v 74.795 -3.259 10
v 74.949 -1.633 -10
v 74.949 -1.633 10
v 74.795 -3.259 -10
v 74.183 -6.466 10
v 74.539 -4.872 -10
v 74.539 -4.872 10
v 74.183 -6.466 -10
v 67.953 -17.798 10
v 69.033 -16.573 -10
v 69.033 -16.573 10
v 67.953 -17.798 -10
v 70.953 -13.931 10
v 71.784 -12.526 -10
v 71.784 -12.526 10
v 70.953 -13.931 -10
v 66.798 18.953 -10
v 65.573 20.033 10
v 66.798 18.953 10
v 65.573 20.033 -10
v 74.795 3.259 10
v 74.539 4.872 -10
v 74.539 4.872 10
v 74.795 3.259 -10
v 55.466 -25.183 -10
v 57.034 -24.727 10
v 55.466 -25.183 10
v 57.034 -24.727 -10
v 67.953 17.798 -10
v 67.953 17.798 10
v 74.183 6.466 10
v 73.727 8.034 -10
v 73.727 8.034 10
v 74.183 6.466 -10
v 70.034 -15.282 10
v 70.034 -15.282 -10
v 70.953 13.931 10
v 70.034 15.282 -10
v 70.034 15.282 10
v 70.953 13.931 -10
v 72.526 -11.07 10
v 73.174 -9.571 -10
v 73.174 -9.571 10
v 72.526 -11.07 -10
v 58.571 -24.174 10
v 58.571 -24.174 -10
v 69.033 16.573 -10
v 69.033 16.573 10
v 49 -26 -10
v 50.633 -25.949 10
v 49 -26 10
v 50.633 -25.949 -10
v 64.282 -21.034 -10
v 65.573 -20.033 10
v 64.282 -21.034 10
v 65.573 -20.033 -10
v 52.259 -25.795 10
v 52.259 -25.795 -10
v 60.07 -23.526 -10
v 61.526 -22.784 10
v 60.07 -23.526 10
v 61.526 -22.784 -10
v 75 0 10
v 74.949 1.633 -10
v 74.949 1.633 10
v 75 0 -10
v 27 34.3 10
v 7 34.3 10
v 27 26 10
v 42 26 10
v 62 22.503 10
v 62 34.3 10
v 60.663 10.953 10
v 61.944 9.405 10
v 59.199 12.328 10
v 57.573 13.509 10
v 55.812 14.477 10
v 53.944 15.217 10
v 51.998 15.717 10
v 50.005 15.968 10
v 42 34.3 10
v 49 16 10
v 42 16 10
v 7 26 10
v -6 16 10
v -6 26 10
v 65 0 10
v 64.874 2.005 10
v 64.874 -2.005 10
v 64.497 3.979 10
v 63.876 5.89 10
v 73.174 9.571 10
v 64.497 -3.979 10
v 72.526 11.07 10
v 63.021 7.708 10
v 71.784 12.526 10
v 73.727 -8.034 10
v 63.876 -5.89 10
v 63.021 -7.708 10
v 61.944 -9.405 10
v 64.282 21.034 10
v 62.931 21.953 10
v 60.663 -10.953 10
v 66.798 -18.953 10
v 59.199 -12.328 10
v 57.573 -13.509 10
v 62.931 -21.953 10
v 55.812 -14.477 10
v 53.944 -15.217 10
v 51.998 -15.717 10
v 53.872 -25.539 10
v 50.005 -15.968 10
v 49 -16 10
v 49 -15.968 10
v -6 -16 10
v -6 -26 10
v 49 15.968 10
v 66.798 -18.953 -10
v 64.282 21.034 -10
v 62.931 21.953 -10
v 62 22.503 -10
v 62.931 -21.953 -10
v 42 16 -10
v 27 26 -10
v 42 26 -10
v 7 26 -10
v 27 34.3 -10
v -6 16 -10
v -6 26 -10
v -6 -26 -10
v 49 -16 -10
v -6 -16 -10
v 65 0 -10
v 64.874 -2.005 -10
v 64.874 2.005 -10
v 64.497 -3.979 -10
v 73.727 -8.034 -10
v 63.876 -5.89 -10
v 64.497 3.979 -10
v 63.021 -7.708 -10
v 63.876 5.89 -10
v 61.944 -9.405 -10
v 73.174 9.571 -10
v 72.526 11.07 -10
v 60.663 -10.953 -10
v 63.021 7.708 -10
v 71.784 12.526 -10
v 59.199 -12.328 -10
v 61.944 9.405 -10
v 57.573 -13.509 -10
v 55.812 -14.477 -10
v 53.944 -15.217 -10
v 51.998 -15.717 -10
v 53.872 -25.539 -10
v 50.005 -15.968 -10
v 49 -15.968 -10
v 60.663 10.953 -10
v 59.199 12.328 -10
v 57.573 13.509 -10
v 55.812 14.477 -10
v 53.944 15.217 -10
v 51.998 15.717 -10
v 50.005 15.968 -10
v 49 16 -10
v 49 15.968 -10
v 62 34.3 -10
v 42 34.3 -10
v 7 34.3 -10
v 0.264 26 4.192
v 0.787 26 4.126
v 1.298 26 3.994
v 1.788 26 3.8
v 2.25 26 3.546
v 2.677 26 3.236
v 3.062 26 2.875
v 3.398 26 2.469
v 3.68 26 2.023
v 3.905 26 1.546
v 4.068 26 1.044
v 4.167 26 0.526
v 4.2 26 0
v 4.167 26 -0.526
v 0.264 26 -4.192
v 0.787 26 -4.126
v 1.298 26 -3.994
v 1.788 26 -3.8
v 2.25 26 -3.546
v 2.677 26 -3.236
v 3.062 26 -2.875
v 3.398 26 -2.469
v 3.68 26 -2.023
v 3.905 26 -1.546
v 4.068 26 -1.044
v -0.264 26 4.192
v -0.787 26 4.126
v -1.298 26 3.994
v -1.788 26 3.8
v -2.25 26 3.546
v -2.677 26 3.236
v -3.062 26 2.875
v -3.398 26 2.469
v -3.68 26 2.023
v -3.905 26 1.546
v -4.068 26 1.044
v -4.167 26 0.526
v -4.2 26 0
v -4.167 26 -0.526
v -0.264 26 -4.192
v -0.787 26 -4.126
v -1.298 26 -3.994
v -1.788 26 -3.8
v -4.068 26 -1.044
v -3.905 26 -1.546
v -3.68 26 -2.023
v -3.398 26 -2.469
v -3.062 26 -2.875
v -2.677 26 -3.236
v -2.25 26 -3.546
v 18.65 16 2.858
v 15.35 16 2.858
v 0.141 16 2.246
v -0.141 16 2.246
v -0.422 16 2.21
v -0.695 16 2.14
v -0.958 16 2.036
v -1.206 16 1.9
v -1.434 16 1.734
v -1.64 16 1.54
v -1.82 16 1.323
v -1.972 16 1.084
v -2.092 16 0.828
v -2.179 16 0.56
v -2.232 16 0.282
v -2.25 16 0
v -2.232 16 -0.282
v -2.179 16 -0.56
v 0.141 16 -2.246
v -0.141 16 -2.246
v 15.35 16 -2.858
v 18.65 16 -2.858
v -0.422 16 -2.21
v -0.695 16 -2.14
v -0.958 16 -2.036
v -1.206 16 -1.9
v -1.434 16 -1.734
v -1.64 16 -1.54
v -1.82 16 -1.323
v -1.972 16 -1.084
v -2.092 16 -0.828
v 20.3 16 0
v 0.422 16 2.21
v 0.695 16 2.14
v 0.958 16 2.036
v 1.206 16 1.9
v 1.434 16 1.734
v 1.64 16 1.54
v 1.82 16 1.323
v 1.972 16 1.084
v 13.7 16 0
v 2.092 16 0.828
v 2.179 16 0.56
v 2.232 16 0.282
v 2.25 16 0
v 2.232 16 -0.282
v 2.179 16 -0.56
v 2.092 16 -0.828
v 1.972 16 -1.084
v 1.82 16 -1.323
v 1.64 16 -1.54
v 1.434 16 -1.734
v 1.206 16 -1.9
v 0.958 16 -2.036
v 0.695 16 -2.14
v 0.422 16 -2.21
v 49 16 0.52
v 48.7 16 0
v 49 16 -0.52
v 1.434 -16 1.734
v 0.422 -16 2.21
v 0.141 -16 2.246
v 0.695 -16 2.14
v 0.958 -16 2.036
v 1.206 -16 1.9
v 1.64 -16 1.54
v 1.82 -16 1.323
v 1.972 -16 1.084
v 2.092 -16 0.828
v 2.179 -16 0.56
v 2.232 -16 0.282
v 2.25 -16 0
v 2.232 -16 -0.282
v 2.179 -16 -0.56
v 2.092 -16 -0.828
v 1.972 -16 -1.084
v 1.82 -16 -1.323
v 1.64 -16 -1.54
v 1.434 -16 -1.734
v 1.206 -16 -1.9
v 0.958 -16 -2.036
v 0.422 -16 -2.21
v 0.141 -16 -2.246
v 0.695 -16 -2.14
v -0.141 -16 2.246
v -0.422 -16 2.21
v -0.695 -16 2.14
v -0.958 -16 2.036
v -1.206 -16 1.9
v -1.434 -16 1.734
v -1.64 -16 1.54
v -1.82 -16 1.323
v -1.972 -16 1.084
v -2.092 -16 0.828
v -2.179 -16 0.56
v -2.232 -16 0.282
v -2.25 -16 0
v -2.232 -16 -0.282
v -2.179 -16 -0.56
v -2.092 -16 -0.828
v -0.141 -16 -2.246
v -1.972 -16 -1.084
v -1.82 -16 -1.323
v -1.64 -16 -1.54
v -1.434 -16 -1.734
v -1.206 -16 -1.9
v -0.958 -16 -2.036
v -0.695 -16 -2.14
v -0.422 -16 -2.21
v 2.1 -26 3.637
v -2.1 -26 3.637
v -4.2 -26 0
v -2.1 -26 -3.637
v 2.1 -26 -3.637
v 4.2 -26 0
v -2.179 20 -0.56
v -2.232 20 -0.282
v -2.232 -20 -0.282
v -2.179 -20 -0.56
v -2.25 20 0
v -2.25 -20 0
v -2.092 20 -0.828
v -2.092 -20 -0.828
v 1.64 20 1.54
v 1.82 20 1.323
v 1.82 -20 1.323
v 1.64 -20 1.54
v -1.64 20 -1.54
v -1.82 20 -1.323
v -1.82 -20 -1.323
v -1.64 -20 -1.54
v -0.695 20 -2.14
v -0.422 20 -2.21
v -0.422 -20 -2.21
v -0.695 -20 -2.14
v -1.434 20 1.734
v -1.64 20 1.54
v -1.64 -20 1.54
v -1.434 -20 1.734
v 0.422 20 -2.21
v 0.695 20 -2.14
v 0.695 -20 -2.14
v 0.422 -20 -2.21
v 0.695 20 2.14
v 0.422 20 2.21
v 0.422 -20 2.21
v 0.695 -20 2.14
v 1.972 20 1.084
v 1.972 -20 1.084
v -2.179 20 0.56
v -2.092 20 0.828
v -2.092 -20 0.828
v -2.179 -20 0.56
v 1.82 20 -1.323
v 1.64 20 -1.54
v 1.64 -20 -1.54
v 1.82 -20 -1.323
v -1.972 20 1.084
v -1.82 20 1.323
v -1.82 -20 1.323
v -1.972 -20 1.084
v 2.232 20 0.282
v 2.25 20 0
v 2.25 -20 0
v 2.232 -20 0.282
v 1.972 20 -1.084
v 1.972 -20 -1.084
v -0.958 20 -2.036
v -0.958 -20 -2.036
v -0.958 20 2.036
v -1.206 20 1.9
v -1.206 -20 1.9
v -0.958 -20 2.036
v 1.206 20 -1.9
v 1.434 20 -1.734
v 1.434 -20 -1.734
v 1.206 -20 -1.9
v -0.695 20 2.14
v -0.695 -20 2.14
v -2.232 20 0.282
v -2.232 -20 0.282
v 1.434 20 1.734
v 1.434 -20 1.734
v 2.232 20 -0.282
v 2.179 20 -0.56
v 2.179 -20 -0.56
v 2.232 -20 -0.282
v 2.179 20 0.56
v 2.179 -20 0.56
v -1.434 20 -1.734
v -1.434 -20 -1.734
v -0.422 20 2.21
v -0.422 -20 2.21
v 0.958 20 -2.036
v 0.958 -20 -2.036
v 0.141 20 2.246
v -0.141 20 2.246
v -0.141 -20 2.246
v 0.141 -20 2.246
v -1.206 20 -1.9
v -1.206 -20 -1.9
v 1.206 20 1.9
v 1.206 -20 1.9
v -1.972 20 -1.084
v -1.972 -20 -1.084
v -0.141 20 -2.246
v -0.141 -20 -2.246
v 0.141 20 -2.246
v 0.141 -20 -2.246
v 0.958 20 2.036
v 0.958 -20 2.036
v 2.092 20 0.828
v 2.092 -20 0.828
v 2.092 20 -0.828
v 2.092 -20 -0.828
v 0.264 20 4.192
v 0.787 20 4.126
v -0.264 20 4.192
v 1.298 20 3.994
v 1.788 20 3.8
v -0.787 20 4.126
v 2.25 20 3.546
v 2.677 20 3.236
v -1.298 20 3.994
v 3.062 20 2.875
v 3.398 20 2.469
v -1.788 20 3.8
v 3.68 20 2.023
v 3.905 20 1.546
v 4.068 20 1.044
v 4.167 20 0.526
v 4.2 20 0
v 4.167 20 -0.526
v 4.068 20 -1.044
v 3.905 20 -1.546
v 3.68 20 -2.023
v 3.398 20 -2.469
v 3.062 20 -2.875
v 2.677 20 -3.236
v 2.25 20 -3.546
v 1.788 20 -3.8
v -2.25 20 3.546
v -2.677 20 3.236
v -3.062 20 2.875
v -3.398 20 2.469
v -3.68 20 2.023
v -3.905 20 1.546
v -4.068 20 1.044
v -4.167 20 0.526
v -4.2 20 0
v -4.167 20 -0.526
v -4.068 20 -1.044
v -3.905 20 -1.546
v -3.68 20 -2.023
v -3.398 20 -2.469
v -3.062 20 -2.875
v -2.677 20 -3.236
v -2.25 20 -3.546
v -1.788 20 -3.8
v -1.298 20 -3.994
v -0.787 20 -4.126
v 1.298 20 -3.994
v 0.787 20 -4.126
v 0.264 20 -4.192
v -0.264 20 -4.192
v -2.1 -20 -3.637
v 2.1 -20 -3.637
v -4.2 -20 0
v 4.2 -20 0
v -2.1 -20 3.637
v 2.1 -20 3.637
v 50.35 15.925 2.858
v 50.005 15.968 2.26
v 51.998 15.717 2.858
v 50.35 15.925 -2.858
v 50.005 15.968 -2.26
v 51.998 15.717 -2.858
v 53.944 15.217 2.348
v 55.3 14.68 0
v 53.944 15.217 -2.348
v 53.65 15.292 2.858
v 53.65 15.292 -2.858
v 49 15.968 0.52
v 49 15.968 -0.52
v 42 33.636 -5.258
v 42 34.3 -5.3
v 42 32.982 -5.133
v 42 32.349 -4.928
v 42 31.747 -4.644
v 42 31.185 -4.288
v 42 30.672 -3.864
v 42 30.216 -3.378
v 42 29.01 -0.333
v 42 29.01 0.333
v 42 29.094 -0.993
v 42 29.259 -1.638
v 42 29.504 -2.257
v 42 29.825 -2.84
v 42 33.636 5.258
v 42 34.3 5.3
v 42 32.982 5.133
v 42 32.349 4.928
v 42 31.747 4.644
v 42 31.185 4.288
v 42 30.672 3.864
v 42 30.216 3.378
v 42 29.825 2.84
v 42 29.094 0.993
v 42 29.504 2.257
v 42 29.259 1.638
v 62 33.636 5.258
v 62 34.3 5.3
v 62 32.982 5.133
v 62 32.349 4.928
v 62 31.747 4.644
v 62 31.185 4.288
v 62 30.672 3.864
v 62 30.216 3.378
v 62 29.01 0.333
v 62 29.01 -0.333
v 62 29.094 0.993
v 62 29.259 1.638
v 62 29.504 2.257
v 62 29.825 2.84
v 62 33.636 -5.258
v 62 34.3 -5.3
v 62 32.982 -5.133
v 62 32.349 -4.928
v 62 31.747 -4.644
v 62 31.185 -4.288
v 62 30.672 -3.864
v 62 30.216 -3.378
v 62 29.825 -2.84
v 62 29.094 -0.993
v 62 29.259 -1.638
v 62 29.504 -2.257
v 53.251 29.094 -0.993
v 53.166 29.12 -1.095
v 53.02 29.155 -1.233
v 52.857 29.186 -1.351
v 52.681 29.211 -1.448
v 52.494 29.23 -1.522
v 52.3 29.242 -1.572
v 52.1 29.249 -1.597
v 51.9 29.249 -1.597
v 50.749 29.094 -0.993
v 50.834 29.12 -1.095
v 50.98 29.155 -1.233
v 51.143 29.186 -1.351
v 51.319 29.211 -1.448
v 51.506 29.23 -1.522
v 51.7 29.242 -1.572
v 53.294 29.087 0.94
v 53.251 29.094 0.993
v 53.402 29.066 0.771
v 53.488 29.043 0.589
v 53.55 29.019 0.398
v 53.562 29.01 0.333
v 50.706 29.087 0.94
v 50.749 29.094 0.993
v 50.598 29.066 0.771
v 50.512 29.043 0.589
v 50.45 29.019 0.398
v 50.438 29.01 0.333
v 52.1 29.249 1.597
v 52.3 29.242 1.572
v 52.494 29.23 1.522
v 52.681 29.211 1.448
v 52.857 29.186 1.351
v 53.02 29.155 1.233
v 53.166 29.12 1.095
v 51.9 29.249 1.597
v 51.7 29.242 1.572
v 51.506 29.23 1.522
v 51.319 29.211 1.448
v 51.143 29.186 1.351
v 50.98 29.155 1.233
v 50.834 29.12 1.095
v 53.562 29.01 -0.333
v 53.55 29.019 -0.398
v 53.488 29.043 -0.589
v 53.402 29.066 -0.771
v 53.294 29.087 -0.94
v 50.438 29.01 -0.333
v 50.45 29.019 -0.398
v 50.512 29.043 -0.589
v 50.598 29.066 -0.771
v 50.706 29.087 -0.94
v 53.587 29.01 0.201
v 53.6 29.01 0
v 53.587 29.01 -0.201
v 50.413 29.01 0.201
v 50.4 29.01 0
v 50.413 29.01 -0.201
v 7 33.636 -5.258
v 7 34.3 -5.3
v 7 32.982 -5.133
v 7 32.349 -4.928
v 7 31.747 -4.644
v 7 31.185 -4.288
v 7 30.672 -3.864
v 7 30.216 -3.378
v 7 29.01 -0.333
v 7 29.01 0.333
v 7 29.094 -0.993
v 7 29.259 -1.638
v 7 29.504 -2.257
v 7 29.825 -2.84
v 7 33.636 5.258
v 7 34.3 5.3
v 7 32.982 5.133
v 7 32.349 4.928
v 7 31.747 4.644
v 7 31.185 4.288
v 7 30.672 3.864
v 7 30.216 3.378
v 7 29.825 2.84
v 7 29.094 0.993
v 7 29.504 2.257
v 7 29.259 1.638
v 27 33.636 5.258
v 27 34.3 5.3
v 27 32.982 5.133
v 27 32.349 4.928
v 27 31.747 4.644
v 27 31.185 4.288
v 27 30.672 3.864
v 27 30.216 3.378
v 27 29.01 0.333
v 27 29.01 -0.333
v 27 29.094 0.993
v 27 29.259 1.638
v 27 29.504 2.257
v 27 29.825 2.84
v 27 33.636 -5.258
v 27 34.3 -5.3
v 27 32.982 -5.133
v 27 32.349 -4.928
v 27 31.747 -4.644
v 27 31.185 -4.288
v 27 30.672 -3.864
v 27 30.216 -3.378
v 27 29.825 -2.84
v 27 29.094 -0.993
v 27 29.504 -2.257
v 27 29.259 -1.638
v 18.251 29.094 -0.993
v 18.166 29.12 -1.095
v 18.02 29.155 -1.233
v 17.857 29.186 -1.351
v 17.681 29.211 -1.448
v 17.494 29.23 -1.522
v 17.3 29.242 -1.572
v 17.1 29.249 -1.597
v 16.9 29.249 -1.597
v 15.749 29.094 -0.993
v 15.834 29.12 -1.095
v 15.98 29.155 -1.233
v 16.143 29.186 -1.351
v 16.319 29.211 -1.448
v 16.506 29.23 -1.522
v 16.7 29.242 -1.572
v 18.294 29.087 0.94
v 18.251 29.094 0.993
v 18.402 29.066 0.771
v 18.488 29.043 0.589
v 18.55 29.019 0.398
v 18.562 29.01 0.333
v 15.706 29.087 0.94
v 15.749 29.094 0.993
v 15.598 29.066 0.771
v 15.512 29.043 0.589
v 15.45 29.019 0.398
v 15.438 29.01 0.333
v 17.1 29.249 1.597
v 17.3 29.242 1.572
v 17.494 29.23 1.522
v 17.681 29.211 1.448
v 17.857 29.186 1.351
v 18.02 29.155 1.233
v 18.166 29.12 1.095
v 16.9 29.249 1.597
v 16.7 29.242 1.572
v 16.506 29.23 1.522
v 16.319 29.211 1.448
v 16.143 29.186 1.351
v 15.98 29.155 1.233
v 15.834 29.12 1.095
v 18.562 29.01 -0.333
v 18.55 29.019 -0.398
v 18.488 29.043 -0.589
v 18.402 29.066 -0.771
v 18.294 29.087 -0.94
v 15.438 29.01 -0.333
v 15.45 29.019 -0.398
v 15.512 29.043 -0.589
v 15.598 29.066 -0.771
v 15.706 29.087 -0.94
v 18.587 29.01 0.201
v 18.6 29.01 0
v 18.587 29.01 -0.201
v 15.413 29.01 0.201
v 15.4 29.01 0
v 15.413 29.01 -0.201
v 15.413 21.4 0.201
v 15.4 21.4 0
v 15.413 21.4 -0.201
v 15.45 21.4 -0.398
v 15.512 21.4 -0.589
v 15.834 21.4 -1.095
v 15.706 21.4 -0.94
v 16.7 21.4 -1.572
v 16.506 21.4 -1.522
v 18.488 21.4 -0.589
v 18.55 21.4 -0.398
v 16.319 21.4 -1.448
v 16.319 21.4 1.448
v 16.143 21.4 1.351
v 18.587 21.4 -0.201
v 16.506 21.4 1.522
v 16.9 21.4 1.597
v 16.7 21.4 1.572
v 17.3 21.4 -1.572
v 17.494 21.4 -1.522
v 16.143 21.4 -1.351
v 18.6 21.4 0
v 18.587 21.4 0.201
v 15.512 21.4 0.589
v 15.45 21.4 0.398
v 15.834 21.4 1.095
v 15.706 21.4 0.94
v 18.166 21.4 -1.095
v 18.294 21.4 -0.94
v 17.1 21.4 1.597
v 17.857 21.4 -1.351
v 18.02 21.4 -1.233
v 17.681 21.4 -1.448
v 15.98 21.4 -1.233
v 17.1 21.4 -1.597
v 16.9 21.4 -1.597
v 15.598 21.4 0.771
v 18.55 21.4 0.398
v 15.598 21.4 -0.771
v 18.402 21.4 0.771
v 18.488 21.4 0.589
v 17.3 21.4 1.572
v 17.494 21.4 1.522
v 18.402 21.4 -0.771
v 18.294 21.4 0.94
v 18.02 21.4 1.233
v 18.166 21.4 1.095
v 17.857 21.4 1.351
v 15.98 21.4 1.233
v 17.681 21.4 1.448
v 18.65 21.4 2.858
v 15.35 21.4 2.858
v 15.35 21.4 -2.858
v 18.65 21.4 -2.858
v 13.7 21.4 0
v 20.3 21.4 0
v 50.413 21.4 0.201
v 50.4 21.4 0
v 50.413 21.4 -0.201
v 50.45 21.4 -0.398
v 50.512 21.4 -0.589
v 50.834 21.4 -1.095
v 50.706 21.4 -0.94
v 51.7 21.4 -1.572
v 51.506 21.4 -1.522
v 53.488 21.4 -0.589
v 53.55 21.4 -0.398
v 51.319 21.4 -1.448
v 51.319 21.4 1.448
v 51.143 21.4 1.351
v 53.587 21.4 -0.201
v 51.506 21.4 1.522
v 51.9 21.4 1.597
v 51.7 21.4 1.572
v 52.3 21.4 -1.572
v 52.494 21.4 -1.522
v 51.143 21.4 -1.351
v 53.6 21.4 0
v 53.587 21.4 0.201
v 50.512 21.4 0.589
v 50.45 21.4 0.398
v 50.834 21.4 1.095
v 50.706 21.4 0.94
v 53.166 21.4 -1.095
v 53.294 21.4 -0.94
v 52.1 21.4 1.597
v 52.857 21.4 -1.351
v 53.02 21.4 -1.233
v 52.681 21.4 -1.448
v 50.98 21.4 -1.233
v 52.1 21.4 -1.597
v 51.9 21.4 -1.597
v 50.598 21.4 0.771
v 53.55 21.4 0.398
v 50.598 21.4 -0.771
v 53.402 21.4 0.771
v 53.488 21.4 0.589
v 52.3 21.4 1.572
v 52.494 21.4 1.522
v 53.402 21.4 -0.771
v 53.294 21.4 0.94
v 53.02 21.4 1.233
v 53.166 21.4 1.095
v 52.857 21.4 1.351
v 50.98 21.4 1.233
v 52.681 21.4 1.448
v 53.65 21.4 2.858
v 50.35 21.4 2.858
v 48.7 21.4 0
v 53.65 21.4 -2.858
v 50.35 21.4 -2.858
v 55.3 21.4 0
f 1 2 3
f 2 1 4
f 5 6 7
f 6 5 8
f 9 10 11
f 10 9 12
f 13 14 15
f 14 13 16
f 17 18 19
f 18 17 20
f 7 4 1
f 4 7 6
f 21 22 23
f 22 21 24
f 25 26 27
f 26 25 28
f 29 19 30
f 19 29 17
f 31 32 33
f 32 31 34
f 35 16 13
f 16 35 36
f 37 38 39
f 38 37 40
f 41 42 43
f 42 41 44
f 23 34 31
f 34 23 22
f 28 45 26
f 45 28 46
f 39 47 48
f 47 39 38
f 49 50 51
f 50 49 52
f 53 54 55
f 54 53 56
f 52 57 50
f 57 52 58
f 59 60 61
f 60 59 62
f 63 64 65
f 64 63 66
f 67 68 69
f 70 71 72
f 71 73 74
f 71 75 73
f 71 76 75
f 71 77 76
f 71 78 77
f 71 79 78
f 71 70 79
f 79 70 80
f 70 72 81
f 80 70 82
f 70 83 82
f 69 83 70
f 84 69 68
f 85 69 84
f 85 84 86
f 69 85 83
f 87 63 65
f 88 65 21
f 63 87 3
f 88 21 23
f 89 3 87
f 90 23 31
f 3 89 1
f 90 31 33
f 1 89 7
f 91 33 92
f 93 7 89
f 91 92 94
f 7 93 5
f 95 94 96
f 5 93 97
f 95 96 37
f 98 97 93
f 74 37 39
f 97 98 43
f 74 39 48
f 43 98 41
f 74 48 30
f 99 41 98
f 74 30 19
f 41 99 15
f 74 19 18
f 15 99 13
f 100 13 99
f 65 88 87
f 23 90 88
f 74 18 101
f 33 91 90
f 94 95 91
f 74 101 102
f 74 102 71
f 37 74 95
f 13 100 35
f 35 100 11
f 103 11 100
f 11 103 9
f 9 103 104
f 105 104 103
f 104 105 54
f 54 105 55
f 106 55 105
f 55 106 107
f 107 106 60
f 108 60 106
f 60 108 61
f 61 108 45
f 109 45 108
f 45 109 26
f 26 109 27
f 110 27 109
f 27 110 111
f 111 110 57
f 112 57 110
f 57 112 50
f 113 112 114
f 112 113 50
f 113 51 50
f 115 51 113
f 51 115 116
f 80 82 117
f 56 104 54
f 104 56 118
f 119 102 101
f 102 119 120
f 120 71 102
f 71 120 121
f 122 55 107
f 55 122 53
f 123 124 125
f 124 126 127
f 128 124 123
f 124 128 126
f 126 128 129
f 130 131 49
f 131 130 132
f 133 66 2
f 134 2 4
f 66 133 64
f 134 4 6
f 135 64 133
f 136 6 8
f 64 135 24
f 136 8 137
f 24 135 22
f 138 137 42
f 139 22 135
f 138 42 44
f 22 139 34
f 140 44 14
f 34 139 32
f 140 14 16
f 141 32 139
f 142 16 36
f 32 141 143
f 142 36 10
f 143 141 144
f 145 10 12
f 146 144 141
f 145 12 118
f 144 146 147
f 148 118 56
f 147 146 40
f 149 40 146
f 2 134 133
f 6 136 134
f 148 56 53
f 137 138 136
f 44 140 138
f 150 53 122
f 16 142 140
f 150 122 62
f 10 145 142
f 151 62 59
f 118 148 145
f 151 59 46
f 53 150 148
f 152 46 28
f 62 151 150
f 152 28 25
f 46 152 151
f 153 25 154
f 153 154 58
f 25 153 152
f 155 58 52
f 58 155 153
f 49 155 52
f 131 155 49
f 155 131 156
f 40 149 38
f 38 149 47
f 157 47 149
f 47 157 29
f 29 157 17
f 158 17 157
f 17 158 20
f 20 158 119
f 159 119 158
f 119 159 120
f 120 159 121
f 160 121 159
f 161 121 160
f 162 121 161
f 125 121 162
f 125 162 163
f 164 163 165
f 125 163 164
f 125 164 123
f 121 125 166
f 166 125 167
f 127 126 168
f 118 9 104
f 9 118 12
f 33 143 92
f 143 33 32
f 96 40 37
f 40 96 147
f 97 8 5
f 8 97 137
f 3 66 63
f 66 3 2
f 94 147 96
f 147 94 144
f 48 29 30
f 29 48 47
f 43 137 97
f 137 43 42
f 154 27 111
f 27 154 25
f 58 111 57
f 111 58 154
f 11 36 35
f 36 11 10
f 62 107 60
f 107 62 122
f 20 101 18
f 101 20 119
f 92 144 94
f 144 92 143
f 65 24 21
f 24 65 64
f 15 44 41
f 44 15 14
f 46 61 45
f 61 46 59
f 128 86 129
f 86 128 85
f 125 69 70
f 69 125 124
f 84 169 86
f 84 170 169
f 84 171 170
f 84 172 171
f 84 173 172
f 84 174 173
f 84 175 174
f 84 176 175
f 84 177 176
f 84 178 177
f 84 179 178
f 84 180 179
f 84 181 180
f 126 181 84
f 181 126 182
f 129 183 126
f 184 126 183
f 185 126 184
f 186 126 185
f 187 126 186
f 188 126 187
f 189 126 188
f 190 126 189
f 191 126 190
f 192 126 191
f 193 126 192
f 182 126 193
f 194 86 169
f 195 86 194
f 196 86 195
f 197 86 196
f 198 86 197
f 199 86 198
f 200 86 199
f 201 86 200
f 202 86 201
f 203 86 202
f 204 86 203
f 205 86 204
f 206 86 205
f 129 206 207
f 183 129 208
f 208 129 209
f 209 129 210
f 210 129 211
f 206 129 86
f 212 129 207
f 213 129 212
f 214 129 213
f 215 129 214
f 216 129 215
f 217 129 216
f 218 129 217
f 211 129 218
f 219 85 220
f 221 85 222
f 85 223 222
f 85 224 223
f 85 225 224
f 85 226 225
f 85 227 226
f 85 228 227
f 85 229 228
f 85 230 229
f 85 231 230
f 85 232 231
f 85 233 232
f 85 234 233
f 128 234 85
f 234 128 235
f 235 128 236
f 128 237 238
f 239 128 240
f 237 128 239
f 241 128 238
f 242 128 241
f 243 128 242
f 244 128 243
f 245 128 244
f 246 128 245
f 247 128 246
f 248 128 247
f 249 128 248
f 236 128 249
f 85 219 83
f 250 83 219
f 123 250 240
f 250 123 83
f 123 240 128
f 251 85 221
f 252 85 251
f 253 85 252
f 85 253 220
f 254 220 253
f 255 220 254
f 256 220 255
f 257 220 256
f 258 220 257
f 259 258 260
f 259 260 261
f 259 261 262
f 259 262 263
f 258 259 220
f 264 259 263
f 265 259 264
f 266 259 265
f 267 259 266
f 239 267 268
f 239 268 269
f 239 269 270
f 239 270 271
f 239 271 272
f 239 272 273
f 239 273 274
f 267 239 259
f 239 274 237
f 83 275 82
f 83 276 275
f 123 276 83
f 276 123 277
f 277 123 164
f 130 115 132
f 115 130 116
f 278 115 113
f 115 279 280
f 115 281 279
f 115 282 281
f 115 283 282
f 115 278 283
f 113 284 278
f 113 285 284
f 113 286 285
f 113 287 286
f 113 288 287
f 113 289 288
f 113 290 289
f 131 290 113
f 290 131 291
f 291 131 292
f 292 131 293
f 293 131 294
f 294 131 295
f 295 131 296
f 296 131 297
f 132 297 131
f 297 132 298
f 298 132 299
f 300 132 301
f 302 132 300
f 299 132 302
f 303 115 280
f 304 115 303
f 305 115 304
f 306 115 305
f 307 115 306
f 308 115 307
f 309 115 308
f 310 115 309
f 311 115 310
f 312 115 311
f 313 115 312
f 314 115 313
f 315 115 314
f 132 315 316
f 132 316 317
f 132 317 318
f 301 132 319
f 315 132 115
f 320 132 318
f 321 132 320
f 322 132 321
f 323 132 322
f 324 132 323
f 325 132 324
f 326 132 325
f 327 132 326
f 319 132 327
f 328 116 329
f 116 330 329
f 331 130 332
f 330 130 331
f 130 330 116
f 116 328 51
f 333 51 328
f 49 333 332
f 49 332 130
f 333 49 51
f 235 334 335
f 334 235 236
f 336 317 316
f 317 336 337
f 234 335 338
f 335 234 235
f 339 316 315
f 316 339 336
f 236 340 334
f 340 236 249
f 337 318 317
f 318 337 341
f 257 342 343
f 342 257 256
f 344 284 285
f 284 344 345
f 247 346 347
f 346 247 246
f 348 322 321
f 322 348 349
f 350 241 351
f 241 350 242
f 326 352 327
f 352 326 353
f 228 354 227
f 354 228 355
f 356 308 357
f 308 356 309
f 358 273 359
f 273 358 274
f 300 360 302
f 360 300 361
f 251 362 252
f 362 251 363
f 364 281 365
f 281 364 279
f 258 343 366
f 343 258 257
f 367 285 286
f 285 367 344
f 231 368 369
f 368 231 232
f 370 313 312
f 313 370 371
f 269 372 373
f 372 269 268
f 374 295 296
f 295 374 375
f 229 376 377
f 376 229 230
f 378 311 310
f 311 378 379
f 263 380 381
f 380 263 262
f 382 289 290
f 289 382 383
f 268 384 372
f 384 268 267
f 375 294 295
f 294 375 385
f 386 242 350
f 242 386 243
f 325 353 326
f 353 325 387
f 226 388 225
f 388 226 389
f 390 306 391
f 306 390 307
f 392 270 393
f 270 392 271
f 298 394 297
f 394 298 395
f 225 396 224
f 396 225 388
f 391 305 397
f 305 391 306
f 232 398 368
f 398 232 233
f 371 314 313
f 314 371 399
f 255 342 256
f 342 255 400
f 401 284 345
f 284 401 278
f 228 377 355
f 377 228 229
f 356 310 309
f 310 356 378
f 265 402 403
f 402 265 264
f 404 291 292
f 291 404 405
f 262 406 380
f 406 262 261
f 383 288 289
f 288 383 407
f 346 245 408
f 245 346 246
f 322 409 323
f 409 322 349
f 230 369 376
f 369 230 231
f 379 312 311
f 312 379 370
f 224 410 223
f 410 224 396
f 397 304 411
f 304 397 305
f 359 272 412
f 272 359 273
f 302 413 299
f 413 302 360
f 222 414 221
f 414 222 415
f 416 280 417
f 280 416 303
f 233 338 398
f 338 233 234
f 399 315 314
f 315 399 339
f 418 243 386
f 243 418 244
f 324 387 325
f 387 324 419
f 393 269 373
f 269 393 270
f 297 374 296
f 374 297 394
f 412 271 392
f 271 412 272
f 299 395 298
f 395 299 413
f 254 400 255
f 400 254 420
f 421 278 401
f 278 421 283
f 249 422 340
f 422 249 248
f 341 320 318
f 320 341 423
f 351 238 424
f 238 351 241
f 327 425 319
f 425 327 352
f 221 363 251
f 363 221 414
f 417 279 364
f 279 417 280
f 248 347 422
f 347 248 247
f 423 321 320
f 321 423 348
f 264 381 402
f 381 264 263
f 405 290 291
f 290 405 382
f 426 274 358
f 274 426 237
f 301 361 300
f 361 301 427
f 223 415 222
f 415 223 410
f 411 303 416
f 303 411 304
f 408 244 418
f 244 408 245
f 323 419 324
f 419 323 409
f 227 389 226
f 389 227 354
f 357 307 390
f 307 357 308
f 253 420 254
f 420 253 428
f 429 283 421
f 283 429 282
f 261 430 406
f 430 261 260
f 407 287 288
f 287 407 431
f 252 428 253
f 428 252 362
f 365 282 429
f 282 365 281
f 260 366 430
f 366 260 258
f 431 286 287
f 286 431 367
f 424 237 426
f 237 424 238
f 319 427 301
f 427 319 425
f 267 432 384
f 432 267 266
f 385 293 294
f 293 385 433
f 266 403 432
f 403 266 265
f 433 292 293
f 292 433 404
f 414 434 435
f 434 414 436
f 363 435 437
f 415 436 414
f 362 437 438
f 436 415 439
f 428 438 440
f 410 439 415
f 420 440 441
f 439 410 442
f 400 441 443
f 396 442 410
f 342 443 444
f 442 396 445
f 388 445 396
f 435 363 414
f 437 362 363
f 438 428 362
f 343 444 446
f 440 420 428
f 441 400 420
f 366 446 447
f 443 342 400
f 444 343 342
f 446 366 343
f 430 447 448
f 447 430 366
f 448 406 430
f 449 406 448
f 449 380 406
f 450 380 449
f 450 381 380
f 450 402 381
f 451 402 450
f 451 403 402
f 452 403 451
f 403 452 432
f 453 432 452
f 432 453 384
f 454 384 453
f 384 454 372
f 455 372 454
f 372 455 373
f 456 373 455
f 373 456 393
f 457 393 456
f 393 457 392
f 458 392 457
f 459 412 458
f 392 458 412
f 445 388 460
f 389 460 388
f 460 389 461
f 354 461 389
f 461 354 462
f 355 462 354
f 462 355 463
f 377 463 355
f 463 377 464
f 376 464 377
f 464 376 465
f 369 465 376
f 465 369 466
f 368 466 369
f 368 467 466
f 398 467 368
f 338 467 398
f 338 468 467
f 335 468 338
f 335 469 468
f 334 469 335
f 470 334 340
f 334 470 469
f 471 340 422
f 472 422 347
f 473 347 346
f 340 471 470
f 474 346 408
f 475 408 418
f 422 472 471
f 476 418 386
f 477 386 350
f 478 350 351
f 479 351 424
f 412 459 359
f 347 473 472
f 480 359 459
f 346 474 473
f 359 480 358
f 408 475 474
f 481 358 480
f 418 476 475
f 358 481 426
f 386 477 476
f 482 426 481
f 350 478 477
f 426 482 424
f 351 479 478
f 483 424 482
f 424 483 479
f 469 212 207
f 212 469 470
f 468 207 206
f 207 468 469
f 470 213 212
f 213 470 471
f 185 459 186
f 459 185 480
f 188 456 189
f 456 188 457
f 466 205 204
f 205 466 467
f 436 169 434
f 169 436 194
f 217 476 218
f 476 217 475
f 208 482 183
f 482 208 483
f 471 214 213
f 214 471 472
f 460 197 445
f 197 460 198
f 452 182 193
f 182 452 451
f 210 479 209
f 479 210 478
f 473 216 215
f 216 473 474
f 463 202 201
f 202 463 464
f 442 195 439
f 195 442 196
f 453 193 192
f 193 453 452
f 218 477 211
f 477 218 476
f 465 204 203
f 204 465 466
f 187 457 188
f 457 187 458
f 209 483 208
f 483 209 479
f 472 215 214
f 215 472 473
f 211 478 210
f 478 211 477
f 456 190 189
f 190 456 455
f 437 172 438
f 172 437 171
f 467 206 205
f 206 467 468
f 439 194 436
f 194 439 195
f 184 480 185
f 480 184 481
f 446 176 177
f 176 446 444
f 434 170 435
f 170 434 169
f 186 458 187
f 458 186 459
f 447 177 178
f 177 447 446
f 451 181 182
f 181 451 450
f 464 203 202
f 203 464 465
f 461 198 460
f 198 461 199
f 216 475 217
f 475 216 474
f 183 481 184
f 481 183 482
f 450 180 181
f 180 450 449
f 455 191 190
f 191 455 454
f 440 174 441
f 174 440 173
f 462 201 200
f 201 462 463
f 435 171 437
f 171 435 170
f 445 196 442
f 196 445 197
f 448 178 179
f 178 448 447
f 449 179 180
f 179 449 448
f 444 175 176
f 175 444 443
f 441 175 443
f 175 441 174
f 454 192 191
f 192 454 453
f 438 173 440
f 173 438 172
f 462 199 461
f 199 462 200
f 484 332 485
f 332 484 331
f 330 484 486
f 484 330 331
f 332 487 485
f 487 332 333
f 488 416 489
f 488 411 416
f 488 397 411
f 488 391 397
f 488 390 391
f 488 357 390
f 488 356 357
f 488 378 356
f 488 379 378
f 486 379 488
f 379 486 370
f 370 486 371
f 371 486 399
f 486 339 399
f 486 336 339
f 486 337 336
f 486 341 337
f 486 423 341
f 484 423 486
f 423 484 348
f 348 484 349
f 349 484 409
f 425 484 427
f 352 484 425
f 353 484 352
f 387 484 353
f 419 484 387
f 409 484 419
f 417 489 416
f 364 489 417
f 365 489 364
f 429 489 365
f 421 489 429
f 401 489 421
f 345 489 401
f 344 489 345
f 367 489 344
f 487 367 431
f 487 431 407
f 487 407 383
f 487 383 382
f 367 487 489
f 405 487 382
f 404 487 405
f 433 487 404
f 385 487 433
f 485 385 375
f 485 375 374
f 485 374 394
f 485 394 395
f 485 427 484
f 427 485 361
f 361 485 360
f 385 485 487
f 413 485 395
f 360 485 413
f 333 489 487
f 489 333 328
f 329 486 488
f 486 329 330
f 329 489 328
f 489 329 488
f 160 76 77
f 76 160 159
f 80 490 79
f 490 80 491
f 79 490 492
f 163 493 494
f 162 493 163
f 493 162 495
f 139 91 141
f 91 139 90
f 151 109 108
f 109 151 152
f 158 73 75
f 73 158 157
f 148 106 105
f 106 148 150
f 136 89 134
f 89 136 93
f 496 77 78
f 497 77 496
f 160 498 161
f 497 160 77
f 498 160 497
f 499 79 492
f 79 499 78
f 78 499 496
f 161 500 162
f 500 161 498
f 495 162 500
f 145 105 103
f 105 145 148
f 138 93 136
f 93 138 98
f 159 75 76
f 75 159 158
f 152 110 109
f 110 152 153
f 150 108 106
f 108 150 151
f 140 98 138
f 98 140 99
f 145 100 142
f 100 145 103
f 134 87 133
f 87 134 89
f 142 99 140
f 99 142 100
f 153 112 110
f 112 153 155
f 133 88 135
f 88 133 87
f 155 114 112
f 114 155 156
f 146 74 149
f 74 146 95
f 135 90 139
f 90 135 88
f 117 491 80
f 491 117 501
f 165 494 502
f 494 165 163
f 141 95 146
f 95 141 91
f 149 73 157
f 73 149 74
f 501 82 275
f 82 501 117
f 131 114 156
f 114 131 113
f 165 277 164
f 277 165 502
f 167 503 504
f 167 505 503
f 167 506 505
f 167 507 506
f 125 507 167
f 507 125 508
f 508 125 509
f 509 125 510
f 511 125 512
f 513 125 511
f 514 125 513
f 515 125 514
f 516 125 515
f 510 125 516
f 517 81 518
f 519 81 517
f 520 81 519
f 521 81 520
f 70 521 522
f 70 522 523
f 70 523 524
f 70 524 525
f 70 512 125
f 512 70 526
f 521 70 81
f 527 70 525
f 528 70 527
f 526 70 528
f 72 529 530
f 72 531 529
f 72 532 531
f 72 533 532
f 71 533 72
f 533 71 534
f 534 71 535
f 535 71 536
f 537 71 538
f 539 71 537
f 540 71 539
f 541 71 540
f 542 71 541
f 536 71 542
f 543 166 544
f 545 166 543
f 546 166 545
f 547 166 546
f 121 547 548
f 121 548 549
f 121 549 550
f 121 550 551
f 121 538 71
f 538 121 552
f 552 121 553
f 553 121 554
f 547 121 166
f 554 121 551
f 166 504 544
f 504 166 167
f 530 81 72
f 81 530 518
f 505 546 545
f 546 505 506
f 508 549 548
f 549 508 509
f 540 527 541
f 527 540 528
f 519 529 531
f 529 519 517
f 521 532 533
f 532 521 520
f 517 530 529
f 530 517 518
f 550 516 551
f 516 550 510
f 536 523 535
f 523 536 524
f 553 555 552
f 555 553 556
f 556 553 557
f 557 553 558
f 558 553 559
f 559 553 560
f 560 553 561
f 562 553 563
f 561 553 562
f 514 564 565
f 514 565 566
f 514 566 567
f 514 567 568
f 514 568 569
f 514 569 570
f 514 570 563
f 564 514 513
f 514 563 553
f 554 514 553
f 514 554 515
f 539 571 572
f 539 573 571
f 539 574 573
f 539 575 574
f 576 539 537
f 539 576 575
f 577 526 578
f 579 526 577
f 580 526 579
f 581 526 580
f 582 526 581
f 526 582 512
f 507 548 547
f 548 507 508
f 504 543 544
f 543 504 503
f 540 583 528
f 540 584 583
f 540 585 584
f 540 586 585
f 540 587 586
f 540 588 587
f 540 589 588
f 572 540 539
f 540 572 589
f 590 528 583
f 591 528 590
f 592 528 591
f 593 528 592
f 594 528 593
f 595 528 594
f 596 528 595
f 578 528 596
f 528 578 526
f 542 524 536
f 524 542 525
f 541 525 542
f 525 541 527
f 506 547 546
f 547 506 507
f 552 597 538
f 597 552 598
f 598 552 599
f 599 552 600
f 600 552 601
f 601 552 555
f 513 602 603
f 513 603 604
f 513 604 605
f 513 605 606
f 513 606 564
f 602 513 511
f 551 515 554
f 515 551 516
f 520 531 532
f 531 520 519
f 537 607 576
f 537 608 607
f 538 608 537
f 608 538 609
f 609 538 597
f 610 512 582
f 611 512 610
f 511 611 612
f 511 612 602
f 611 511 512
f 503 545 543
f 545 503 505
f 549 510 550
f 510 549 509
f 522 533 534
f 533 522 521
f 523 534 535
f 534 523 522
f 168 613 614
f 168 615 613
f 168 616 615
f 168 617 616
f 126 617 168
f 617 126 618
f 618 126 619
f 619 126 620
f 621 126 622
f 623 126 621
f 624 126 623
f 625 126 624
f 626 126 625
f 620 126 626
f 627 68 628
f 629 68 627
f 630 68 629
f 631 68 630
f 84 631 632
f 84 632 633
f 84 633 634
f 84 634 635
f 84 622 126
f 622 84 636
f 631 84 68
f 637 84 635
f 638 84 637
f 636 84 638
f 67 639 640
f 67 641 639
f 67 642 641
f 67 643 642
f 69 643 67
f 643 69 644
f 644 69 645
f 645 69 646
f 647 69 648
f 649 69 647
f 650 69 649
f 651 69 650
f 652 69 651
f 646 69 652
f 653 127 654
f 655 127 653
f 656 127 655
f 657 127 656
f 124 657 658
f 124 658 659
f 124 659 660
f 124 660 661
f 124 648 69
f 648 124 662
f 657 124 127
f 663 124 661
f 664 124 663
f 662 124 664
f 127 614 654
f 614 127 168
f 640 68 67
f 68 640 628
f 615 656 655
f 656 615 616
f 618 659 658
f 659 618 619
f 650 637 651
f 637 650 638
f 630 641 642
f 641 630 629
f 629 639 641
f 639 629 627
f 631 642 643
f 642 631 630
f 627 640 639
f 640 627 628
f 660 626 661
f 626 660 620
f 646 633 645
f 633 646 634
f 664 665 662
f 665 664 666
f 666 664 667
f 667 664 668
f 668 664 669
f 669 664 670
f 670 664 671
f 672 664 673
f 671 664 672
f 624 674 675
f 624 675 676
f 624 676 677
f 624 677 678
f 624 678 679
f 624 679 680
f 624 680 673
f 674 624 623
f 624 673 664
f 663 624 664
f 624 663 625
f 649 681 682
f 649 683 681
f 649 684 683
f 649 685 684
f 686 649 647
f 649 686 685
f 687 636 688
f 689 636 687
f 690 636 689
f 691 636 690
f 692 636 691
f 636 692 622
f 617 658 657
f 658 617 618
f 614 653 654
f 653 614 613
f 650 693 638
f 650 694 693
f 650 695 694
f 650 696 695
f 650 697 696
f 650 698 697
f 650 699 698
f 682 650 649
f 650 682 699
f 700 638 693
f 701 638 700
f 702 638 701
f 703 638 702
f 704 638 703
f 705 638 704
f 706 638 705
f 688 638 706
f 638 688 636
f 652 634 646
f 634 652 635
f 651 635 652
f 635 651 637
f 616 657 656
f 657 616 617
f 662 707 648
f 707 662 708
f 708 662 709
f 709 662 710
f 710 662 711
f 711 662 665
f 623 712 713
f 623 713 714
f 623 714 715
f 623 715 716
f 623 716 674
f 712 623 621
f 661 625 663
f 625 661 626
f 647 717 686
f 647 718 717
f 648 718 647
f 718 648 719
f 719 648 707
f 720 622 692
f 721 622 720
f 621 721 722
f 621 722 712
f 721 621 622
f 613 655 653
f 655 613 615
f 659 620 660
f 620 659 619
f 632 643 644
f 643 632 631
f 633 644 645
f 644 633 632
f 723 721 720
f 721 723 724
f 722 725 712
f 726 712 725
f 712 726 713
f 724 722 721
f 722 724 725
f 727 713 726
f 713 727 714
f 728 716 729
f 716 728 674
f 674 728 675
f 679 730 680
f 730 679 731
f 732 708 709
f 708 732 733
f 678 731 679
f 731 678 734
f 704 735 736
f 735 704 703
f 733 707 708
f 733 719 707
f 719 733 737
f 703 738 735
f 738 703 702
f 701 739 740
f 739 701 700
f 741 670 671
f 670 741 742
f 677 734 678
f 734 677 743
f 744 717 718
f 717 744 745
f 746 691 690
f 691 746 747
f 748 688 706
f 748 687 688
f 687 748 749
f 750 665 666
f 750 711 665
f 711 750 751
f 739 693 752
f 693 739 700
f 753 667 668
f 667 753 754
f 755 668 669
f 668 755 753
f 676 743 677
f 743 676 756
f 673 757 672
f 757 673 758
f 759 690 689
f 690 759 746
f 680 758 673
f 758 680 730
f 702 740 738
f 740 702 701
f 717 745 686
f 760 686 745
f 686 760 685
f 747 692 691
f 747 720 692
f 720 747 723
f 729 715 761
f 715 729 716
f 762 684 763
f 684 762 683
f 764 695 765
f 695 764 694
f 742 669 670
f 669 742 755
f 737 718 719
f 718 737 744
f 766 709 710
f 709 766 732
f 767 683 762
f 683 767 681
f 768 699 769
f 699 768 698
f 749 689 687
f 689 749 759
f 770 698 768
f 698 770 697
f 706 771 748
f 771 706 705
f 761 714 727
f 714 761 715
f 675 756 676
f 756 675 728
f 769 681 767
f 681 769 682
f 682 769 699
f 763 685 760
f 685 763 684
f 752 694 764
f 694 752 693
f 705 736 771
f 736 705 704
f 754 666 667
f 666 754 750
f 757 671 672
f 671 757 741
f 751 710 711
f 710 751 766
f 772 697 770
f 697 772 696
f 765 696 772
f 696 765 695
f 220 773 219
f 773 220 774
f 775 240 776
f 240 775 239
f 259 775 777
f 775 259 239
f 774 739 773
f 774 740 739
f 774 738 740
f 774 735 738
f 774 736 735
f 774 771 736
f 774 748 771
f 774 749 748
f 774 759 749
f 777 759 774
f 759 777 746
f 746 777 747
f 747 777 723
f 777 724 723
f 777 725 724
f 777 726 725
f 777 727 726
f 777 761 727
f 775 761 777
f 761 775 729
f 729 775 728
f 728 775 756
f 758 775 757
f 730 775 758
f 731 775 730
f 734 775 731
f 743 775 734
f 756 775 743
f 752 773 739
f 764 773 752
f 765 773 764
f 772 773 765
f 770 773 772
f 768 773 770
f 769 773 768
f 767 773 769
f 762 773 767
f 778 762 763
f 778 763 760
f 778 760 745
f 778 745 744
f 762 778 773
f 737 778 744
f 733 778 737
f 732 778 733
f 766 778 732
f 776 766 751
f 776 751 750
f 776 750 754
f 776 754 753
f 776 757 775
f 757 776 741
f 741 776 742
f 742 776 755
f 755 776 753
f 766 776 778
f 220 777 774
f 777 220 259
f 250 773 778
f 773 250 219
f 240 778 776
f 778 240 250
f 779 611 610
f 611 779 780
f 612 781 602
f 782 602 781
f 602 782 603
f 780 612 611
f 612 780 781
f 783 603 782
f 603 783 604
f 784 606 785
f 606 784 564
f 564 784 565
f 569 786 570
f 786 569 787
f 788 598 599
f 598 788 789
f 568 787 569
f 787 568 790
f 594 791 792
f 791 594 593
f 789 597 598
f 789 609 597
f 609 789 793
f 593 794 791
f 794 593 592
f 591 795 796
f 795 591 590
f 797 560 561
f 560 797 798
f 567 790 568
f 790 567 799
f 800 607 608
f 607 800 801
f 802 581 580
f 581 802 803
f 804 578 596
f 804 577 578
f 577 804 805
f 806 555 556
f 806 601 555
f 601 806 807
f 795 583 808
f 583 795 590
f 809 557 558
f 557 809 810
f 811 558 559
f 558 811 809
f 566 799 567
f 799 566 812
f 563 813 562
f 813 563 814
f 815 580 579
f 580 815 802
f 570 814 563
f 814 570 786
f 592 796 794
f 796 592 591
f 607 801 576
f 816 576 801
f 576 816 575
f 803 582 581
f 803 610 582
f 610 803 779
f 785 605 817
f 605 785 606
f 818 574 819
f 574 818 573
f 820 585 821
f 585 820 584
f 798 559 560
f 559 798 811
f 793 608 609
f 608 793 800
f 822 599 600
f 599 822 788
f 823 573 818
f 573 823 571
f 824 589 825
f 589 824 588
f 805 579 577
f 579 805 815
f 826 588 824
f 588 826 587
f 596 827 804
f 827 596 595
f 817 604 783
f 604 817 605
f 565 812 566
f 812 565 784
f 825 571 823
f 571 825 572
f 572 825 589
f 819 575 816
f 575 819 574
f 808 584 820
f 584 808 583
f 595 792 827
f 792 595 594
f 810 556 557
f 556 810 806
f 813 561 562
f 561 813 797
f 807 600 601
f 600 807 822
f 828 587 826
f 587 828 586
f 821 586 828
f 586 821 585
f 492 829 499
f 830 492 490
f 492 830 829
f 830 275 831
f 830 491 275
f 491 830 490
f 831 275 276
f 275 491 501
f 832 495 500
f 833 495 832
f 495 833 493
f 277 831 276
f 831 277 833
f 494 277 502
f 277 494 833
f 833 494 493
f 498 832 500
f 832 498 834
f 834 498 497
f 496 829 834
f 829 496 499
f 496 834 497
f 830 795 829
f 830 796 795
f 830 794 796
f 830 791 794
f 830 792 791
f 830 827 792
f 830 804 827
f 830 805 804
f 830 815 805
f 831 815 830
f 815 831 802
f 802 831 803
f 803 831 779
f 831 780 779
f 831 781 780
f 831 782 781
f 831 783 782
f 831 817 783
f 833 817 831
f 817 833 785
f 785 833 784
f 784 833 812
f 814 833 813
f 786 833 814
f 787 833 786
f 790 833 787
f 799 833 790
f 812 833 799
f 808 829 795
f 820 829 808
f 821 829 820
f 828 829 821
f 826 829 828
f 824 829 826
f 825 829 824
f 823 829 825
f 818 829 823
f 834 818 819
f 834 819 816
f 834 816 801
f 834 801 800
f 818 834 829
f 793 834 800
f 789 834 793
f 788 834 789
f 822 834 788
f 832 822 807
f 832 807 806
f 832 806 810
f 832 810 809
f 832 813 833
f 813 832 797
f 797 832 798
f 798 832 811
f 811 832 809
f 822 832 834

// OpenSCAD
// file: ../888_2014.scad
//VIDLICE PRO ZADNI KOLO

include <../parameters.scad>

cylinder_2_thickness = 1.5;

fork_wheel_width = wheel_inner_thickness + 2*cylinder_2_thickness + 1;
screw_length = 45;
fork_thickness = 20;
fork_width = 10 ;
fork_hole_diameter = 10 ;
fork_lenght = 55;

pipe_diameter = tube_for_undercarriage_outer_diameter;
pipe_holder_length = 20;
pipe_holder_thickness = pipe_diameter/2+3;

pipe_holder_distance = 35;
pipe_holder1_pos = -13;
pipe_holder2_pos = pipe_holder1_pos + pipe_holder_distance;
pipe_holder_space =3;


module 888_2014() {

rotate([0, 90, 0]) translate([-fork_lenght+6, 0, -fork_thickness/2])
    difference() {
      union () {
        difference() {
            union () {
                cylinder ( h=fork_thickness, d=2*fork_width+fork_wheel_width, $fn=100);

                translate ([0,fork_wheel_width/2,0])
                    cube ([fork_lenght, fork_width, fork_thickness]);

                translate ([0,-(fork_wheel_width/2+fork_width),0])
                    cube ([fork_lenght, fork_width, fork_thickness]);
            }

            translate([0, 0, -10])
                cylinder ( h=fork_thickness+20, d=fork_wheel_width, $fn=50);

            translate([0,-(fork_wheel_width/2),-10])
                cube ([2*fork_width+fork_wheel_width+20,fork_wheel_width,fork_thickness+20 ]);

            //osa M4
            rotate ([90,0,0,]) {
                translate([fork_lenght-6, fork_thickness/2, 0])
                  cylinder (h=2*fork_width+fork_wheel_width+20, d=M4_screw_diameter, center=true, $fn=50);

                translate([fork_lenght-6,fork_thickness/2, -30 - (screw_length-5)/2])
                  cylinder (h=30, d=M4_nut_diameter, $fn=50);

                translate([fork_lenght-6, fork_thickness/2,  (screw_length-5)/2])
                  cylinder (h=30, d=M4_nut_diameter, $fn=6);
            }
        }

        //drzaky trubky - srouby M3
        difference() {
            translate([pipe_holder1_pos,fork_wheel_width/2, 0])
              cube ([pipe_holder_length, pipe_holder_thickness + fork_width, fork_thickness]);
            rotate ([0,90,0])
              translate([-fork_thickness/2, fork_wheel_width/2+fork_width+pipe_diameter/2+pipe_holder_space, 0])
                cylinder(h=fork_lenght*2, d=pipe_diameter, $fn=50, center = true);
        }

        difference() {
            translate([pipe_holder2_pos,fork_wheel_width/2+fork_width, 0])
              cube ([pipe_holder_length, pipe_holder_thickness, fork_thickness]);
            rotate ([0,90,0])
              translate([-fork_thickness/2, fork_wheel_width/2+fork_width+pipe_diameter/2+pipe_holder_space, 0])
                cylinder(h=fork_lenght*2, d=pipe_diameter, $fn=50, center = true);
        }
      }
      rotate ([90,0,0,]) {
          translate([pipe_holder2_pos+pipe_holder_length/2, fork_thickness/2, -fork_wheel_width])
            cylinder (h=fork_wheel_width, d=M3_screw_diameter, $fn=50);

          translate([pipe_holder2_pos+pipe_holder_length/2, fork_thickness/2, -(0.5*fork_wheel_width+M3_nut_height*2)])
            cylinder (h=fork_width, d=M3_nut_diameter, $fn=6);
      }
      rotate ([90,0,0,]) {
          translate([pipe_holder1_pos+pipe_holder_length/2, fork_thickness/2, -fork_wheel_width])
            cylinder (h=fork_wheel_width, d=M3_screw_diameter, $fn=50);

          translate([pipe_holder1_pos+pipe_holder_length/2, fork_thickness/2, -(0.5*fork_wheel_width+M3_nut_height*2)])
            cylinder (h=fork_width, d=M3_nut_diameter, $fn=6);
      }
    }
}

module 888_2014_drill(){
    difference(){
        cube([25, 25, pipe_holder_distance+pipe_holder_length], center = true);

        cylinder(d = tube_for_undercarriage_outer_diameter, h = pipe_holder_distance+20+global_clearance, $fn = 80, center = true);

        translate([0, 0, pipe_holder_distance/2])
            rotate([90, 0, 0])
                cylinder(d = M3_screw_diameter, h = 30, center = true, $fn = 80);

        translate([0, 0, -pipe_holder_distance/2])
            rotate([90, 0, 0])
                cylinder(d = M3_screw_diameter, h = 30, center = true, $fn = 80);
    }
}

888_2014();
888_2014_drill();
// main file
include <../../parameters.scad>
use <../888_2014.scad>


translate([0, 0, 0]){
    rotate([0, 90, 0])
        888_2014();
}
